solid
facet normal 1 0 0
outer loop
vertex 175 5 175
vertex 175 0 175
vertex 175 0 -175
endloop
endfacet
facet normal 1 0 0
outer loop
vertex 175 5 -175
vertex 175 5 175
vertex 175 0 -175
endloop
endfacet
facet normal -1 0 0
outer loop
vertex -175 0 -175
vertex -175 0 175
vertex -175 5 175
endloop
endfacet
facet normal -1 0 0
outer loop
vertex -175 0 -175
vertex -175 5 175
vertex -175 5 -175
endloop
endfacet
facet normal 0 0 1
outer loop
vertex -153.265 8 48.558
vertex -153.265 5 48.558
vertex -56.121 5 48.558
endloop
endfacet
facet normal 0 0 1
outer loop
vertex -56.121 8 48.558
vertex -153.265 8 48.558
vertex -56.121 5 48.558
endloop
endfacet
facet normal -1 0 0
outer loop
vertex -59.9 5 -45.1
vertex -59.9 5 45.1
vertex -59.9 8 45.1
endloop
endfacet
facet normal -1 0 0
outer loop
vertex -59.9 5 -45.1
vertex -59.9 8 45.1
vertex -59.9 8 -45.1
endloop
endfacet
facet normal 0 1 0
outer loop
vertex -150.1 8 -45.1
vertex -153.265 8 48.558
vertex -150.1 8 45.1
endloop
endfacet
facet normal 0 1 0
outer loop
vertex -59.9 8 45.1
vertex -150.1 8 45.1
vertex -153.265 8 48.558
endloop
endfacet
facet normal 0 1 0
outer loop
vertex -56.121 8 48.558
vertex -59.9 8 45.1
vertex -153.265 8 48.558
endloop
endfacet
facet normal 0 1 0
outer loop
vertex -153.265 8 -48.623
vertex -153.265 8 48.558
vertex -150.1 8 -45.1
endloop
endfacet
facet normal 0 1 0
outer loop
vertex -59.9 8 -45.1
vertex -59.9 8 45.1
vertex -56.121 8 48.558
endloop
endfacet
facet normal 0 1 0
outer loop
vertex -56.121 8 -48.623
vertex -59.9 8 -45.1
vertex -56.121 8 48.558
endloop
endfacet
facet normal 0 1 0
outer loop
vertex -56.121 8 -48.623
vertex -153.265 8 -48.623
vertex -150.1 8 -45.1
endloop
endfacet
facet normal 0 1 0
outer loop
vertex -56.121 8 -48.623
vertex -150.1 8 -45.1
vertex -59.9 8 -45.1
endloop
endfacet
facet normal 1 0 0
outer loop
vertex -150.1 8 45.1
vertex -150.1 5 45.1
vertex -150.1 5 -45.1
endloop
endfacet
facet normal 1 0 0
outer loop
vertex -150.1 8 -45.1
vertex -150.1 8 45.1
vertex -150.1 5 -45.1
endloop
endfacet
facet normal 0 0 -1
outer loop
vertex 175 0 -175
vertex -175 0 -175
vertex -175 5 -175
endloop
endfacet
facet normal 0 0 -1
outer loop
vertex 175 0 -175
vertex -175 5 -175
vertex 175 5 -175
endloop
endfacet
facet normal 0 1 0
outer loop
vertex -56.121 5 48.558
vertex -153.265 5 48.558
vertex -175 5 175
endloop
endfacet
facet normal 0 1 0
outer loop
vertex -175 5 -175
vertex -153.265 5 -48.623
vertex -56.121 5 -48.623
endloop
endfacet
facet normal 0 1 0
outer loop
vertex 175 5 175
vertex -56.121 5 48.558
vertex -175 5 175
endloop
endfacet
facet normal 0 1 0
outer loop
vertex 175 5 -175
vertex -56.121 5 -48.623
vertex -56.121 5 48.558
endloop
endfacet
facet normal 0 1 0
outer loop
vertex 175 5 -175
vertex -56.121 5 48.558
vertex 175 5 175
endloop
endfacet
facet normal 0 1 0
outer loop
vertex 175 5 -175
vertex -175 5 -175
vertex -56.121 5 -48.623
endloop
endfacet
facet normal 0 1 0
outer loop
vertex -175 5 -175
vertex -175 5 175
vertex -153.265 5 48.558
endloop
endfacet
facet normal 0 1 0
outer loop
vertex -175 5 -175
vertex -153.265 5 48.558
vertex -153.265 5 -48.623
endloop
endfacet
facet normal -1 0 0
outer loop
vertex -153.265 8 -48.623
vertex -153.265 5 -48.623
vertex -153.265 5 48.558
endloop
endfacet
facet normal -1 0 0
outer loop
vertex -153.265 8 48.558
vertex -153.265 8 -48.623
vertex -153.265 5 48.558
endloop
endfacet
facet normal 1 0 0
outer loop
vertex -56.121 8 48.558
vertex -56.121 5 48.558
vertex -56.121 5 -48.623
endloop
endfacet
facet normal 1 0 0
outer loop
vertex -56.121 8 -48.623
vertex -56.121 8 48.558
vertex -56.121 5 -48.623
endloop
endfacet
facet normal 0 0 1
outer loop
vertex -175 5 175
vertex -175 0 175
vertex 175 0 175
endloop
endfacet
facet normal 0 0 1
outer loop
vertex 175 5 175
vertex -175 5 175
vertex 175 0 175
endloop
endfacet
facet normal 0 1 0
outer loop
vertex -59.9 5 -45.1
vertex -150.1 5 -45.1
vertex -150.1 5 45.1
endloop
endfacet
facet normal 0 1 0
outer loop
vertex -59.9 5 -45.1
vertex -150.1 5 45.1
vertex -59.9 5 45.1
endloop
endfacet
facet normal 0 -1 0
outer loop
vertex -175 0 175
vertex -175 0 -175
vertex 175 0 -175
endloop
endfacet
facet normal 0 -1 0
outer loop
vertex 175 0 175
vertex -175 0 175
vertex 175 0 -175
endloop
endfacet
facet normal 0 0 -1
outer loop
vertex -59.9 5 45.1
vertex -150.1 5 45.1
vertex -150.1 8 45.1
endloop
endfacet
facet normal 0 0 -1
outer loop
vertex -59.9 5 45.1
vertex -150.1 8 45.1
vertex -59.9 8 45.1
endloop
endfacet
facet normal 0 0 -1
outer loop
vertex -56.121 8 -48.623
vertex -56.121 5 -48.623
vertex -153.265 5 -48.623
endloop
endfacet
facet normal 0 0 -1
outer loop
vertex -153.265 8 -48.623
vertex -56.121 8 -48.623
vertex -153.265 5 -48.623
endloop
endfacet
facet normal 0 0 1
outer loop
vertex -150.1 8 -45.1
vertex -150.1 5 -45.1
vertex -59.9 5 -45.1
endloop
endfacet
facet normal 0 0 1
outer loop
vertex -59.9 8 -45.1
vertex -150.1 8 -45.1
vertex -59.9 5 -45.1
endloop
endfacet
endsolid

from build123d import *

# Parameters (mm, degrees)
SKETCH2_W           = 350
SKETCH2_H           = 350
BOSS_EXTRUDE1_DEPTH = 5
SKETCH4_W           = 90.2
SKETCH4_H           = 90.2
BOSS_EXTRUDE2_DEPTH = 3


with BuildPart() as part:
    # Sketch2 → Boss-Extrude1 (new body)
    with BuildSketch(Plane(origin=(0, 0, 0), x_dir=(1, 0, 0), z_dir=(0, 1, 0))):
        Rectangle(SKETCH2_W, SKETCH2_H)
    extrude(amount=BOSS_EXTRUDE1_DEPTH)

    # Sketch4 → Boss-Extrude2 (add)
    with BuildSketch(Plane(origin=(0, 5, 0), x_dir=(1, 0, 0), z_dir=(0, 1, 0))):
        Polygon((-56.121208512, 45.1), (-56.121208512, 48.622803372), (-59.9, 48.622803372), (-150.1, 48.622803372), (-153.264875212, 48.622803372), (-153.264875212, 45.1), (-153.264875212, -45.1), (-153.264875212, -48.557517283), (-150.1, -48.557517283), (-59.9, -48.557517283), (-56.121208512, -48.557517283), (-56.121208512, -45.1), align=None)
        with Locations((-105, 0)):
            Rectangle(SKETCH4_W, SKETCH4_H, mode=Mode.SUBTRACT)
    extrude(amount=BOSS_EXTRUDE2_DEPTH)


solid = part.part
